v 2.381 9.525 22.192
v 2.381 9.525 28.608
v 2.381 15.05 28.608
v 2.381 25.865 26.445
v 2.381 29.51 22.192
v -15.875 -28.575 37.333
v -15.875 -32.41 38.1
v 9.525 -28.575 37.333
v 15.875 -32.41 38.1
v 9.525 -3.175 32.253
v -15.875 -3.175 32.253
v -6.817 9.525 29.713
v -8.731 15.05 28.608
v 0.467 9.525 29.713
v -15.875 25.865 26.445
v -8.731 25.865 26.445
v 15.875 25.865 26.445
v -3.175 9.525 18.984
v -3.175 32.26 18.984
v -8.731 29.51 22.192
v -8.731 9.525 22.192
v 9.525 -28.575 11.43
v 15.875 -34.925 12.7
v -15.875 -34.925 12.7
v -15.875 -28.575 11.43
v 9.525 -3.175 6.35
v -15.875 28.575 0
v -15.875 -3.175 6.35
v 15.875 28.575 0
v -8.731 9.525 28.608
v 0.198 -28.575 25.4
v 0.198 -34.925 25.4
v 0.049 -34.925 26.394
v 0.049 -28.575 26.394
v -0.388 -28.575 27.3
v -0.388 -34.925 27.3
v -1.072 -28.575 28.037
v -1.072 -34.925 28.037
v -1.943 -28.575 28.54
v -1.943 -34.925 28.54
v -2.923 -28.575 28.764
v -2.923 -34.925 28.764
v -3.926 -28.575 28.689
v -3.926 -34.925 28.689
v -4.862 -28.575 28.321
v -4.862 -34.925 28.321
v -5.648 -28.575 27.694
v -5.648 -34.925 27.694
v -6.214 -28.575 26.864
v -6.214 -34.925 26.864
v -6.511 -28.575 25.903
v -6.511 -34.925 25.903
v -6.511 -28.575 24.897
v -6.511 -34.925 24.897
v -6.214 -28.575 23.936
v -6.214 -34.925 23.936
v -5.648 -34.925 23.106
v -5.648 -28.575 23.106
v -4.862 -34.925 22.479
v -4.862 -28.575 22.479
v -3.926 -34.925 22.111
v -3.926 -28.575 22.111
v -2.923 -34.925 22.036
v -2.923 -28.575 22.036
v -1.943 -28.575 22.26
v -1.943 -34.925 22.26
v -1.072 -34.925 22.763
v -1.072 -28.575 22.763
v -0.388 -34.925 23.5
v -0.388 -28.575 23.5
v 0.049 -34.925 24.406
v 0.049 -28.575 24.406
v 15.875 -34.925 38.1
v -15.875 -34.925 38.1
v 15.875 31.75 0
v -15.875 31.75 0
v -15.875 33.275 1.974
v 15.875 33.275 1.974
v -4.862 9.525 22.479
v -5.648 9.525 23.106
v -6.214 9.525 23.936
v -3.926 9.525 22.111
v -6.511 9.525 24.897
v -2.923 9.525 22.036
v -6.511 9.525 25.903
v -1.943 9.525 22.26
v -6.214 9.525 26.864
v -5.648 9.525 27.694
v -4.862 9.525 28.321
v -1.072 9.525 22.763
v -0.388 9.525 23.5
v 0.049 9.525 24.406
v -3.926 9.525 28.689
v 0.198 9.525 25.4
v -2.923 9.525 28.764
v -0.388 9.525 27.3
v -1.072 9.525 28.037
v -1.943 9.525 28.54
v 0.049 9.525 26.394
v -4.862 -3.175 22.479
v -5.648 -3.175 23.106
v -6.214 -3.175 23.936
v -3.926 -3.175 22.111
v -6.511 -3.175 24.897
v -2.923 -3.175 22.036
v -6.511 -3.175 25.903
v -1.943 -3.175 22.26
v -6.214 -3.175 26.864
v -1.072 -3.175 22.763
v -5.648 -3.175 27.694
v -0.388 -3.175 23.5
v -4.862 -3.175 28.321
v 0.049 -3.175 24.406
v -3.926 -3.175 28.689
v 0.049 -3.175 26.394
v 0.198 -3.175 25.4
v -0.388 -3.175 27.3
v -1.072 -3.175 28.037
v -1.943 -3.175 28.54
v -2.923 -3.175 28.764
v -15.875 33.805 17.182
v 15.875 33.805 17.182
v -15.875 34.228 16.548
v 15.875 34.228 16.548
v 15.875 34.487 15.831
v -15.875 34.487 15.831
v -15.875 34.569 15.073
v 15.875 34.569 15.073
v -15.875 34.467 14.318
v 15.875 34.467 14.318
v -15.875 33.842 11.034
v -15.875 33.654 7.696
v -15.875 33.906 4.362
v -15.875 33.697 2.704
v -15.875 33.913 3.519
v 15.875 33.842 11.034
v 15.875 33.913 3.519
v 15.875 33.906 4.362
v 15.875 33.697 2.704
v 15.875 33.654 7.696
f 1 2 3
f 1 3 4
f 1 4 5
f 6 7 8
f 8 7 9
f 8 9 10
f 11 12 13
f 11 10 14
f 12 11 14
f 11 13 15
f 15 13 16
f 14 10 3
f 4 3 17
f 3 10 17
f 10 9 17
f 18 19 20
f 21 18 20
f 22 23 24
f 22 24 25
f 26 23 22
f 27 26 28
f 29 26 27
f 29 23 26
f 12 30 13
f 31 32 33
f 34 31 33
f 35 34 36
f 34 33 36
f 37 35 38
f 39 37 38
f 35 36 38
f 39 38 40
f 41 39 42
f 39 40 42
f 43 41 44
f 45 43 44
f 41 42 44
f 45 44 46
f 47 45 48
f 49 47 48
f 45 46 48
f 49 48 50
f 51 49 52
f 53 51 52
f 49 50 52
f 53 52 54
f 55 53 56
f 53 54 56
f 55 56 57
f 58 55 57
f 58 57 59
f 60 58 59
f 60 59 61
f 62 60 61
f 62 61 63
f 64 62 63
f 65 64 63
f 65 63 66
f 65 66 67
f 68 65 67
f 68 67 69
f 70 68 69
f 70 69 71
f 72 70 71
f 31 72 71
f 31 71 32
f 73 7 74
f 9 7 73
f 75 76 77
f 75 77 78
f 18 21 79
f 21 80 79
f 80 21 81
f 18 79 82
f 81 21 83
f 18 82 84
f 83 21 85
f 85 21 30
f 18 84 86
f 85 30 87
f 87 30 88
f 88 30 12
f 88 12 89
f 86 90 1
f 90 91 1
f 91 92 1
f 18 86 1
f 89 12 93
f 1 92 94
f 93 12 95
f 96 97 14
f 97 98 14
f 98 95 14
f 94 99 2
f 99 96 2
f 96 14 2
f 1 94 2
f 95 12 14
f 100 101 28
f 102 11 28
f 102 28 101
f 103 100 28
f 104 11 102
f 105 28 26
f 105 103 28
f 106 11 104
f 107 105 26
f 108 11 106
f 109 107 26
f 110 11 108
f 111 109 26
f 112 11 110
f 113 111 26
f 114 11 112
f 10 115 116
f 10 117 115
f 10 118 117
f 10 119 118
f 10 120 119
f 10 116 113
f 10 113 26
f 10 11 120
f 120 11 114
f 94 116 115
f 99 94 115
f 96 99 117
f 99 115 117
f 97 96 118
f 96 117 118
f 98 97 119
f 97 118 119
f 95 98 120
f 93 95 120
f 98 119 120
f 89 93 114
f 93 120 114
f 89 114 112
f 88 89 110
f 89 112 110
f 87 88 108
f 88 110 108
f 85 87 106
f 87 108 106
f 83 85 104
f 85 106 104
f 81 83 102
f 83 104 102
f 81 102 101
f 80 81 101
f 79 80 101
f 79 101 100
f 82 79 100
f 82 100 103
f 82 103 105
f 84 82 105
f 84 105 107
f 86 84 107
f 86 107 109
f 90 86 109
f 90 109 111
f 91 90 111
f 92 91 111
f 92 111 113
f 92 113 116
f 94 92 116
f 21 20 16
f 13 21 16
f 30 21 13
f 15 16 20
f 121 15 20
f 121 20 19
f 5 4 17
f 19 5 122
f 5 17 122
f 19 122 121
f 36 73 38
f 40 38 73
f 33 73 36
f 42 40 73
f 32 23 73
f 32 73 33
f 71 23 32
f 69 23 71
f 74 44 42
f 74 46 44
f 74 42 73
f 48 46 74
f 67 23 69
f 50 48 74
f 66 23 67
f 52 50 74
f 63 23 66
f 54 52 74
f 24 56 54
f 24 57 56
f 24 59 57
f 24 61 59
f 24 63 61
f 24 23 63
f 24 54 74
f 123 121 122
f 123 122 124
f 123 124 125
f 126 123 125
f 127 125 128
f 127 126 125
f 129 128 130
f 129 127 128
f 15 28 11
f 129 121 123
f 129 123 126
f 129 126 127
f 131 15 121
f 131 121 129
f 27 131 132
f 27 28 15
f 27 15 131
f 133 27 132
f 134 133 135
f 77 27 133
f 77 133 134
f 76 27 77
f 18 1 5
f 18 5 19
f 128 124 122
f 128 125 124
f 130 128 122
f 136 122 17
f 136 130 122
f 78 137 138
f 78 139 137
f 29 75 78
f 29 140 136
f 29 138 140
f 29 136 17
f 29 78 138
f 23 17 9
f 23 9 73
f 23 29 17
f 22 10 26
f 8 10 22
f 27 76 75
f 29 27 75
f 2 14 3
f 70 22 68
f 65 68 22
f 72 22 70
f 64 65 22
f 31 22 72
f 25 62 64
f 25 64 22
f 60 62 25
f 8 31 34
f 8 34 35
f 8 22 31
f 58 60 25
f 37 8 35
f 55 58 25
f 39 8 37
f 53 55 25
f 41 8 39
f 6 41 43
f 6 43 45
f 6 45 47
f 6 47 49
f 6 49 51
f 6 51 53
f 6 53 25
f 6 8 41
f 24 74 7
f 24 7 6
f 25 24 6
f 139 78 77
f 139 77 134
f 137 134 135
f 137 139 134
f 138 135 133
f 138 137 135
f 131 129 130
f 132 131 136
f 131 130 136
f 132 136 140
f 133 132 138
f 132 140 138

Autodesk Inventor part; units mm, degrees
ref_plane "YZ Plane" through (0, 0, 0) normal (1, 0, 0) x (0, 1, 0)
ref_plane "XZ Plane" through (0, 0, 0) normal (0, 1, 0) x (-1, 0, 0)
ref_plane "XY Plane" through (0, 0, 0) normal (0, 0, 1) x (1, 0, 0)
sketch "Sketch1" plane through (0, 0, 0) normal (0, 0, 1) x (1, 0, 0)
  line L0 (15.875, -34.925) -> (-15.875, -34.925)
  line L1 (-15.875, -34.925) -> (-15.875, 34.925)
  line L2 (-15.875, 34.925) -> (15.875, 34.925)
  line L3 (15.875, 34.925) -> (15.875, -34.925)
  line L4 (15.875, -34.925) -> (-15.875, 34.925) construction
  line L5 (-15.875, -34.925) -> (15.875, 34.925) construction
  point P0 (0, 0)
  dimension "d0" = 31.75
  dimension "d1" = 69.85
extrude "Extrusion1" add sketch "Sketch1" along normal blind 38.1
sketch "Sketch2" plane through (0, 0, 38.1) normal (0, 0, 1) x (1, 0, 0)
  line L0 (9.525, -28.575) -> (-15.875, -28.575)
  line L1 (-15.875, -28.575) -> (-15.875, -3.175)
  line L2 (-15.875, -3.175) -> (9.525, -3.175)
  line L3 (9.525, -3.175) -> (9.525, -28.575)
  line L4 (-15.875, -34.925) -> (15.875, -34.925) projected
  line L5 (15.875, -34.925) -> (15.875, 34.925) projected
  line L6 (-15.875, 34.925) -> (-15.875, -34.925) projected
  point P0 (0, 0)
  dimension "d4" = 6.35
  dimension "d5" = 6.35
  dimension "d6" = 25.4
  dimension "d7" = 25.4
extrude "Extrusion2" cut sketch "Sketch2" against normal through all
sketch "Sketch3" plane through (15.875, -34.925, 0) normal (1, 0, 0) x (0, 0, -1)
  line L0 (-38.1, 69.85) -> (-38.1, 31.75) projected
  line L1 (-38.1, 50.8) -> (-15.875, 69.85)
  line L2 (0, 69.85) -> (-38.1, 69.85) projected
  line L3 (-38.1, 50.8) -> (-38.1, 69.85)
  line L4 (-38.1, 69.85) -> (-15.875, 69.85)
  line L5 (0, 0) -> (0, 69.85) projected
  arc A0 (-15.875, 69.85) -> (0, 69.85) centre (-7.9375, 93.9779) ccw
  line L6 (0, 69.85) -> (-38.1, 69.85) projected
  line L7 (-15.875, 69.85) -> (0, 69.85)
  point P0 (0, 34.925)
  dimension "d10" = 15.875
  dimension "d11" = 19.05
  dimension "d23" = 25.4
extrude "Extrusion3" cut sketch "Sketch3" against normal through all
sketch "Sketch4" plane through (-15.875, -34.925, 0) normal (0, -1, 0) x (1, 0, 0)
  circle A0 centre (12.7, 25.4) radius 3.3734
  line L0 (0, 0) -> (0, 38.1) projected
  line L1 (0, 38.1) -> (31.75, 38.1) projected
  point P0 (15.875, 0)
  dimension "d14" = 12.7
  dimension "d15" = 12.7
  dimension "d16" = 6.7469
extrude "Extrusion4" cut sketch "Sketch4" against normal through all
ref_plane "Work Plane1" through (-15.875, 9.525, 38.1) normal (0, -1, 0) x (1, 0, 0)
sketch "Sketch5" plane through (-15.875, 9.525, 38.1) normal (0, -1, 0) x (1, 0, 0)
  circle A0 centre (12.7, -12.7) radius 3.3734 projected
  line L0 (7.1437, -9.4921) -> (12.7, -6.2842)
  line L1 (12.7, -6.2842) -> (18.2563, -9.4921)
  line L2 (18.2563, -9.4921) -> (18.2562, -15.9079)
  line L3 (18.2562, -15.9079) -> (12.7, -19.1158)
  line L4 (12.7, -19.1158) -> (7.1437, -15.9079)
  line L5 (7.1437, -15.9079) -> (7.1437, -9.4921)
  point P0 (15.875, -38.1)
  dimension "d20" = 11.1125
extrude "Extrusion5" cut sketch "Sketch5" against normal blind 38.1 contours A0 | L0 L1 L2 L3 L4 L5
fillet "Fillet1" radius 3.175 1 edges at (0, 34.925, 15.875)
chamfer "Chamfer1" distance 3.175 angle 45 1 edges at (0, 34.925, 0)
fillet "Fillet2" radius 3.175 1 edges at (0, 34.1233, 3.0721)
sketch "Sketch6" plane through (15.875, -34.925, 38.1) normal (1, 0, 0) x (0, 0, -1)
  line L0 (25.4, 0) -> (38.1, 63.5)
  line L1 (38.1, 63.5) -> (38.1, 0)
  line L2 (38.1, 0) -> (25.4, 0)
  line L3 (38.1, 0) -> (0, 0) projected
  line L4 (38.1, 0) -> (38.1, 66.675) projected
  line L5 (-4.7298, -21.134) -> (20.7966, 106.498)
  line L6 (20.7966, 106.498) -> (-6.997, 112.0567)
  line L7 (-6.997, 112.0567) -> (-32.5234, -15.5753)
  line L8 (-32.5234, -15.5753) -> (-4.7298, -21.134)
  point P0 (38.1, 34.925)
  dimension "d29" = 63.5
  dimension "d30" = 12.7
  dimension "d33" = 25.4
extrude "Extrusion6" cut sketch "Sketch6" against normal through all
properties part number "IntakeStop"
